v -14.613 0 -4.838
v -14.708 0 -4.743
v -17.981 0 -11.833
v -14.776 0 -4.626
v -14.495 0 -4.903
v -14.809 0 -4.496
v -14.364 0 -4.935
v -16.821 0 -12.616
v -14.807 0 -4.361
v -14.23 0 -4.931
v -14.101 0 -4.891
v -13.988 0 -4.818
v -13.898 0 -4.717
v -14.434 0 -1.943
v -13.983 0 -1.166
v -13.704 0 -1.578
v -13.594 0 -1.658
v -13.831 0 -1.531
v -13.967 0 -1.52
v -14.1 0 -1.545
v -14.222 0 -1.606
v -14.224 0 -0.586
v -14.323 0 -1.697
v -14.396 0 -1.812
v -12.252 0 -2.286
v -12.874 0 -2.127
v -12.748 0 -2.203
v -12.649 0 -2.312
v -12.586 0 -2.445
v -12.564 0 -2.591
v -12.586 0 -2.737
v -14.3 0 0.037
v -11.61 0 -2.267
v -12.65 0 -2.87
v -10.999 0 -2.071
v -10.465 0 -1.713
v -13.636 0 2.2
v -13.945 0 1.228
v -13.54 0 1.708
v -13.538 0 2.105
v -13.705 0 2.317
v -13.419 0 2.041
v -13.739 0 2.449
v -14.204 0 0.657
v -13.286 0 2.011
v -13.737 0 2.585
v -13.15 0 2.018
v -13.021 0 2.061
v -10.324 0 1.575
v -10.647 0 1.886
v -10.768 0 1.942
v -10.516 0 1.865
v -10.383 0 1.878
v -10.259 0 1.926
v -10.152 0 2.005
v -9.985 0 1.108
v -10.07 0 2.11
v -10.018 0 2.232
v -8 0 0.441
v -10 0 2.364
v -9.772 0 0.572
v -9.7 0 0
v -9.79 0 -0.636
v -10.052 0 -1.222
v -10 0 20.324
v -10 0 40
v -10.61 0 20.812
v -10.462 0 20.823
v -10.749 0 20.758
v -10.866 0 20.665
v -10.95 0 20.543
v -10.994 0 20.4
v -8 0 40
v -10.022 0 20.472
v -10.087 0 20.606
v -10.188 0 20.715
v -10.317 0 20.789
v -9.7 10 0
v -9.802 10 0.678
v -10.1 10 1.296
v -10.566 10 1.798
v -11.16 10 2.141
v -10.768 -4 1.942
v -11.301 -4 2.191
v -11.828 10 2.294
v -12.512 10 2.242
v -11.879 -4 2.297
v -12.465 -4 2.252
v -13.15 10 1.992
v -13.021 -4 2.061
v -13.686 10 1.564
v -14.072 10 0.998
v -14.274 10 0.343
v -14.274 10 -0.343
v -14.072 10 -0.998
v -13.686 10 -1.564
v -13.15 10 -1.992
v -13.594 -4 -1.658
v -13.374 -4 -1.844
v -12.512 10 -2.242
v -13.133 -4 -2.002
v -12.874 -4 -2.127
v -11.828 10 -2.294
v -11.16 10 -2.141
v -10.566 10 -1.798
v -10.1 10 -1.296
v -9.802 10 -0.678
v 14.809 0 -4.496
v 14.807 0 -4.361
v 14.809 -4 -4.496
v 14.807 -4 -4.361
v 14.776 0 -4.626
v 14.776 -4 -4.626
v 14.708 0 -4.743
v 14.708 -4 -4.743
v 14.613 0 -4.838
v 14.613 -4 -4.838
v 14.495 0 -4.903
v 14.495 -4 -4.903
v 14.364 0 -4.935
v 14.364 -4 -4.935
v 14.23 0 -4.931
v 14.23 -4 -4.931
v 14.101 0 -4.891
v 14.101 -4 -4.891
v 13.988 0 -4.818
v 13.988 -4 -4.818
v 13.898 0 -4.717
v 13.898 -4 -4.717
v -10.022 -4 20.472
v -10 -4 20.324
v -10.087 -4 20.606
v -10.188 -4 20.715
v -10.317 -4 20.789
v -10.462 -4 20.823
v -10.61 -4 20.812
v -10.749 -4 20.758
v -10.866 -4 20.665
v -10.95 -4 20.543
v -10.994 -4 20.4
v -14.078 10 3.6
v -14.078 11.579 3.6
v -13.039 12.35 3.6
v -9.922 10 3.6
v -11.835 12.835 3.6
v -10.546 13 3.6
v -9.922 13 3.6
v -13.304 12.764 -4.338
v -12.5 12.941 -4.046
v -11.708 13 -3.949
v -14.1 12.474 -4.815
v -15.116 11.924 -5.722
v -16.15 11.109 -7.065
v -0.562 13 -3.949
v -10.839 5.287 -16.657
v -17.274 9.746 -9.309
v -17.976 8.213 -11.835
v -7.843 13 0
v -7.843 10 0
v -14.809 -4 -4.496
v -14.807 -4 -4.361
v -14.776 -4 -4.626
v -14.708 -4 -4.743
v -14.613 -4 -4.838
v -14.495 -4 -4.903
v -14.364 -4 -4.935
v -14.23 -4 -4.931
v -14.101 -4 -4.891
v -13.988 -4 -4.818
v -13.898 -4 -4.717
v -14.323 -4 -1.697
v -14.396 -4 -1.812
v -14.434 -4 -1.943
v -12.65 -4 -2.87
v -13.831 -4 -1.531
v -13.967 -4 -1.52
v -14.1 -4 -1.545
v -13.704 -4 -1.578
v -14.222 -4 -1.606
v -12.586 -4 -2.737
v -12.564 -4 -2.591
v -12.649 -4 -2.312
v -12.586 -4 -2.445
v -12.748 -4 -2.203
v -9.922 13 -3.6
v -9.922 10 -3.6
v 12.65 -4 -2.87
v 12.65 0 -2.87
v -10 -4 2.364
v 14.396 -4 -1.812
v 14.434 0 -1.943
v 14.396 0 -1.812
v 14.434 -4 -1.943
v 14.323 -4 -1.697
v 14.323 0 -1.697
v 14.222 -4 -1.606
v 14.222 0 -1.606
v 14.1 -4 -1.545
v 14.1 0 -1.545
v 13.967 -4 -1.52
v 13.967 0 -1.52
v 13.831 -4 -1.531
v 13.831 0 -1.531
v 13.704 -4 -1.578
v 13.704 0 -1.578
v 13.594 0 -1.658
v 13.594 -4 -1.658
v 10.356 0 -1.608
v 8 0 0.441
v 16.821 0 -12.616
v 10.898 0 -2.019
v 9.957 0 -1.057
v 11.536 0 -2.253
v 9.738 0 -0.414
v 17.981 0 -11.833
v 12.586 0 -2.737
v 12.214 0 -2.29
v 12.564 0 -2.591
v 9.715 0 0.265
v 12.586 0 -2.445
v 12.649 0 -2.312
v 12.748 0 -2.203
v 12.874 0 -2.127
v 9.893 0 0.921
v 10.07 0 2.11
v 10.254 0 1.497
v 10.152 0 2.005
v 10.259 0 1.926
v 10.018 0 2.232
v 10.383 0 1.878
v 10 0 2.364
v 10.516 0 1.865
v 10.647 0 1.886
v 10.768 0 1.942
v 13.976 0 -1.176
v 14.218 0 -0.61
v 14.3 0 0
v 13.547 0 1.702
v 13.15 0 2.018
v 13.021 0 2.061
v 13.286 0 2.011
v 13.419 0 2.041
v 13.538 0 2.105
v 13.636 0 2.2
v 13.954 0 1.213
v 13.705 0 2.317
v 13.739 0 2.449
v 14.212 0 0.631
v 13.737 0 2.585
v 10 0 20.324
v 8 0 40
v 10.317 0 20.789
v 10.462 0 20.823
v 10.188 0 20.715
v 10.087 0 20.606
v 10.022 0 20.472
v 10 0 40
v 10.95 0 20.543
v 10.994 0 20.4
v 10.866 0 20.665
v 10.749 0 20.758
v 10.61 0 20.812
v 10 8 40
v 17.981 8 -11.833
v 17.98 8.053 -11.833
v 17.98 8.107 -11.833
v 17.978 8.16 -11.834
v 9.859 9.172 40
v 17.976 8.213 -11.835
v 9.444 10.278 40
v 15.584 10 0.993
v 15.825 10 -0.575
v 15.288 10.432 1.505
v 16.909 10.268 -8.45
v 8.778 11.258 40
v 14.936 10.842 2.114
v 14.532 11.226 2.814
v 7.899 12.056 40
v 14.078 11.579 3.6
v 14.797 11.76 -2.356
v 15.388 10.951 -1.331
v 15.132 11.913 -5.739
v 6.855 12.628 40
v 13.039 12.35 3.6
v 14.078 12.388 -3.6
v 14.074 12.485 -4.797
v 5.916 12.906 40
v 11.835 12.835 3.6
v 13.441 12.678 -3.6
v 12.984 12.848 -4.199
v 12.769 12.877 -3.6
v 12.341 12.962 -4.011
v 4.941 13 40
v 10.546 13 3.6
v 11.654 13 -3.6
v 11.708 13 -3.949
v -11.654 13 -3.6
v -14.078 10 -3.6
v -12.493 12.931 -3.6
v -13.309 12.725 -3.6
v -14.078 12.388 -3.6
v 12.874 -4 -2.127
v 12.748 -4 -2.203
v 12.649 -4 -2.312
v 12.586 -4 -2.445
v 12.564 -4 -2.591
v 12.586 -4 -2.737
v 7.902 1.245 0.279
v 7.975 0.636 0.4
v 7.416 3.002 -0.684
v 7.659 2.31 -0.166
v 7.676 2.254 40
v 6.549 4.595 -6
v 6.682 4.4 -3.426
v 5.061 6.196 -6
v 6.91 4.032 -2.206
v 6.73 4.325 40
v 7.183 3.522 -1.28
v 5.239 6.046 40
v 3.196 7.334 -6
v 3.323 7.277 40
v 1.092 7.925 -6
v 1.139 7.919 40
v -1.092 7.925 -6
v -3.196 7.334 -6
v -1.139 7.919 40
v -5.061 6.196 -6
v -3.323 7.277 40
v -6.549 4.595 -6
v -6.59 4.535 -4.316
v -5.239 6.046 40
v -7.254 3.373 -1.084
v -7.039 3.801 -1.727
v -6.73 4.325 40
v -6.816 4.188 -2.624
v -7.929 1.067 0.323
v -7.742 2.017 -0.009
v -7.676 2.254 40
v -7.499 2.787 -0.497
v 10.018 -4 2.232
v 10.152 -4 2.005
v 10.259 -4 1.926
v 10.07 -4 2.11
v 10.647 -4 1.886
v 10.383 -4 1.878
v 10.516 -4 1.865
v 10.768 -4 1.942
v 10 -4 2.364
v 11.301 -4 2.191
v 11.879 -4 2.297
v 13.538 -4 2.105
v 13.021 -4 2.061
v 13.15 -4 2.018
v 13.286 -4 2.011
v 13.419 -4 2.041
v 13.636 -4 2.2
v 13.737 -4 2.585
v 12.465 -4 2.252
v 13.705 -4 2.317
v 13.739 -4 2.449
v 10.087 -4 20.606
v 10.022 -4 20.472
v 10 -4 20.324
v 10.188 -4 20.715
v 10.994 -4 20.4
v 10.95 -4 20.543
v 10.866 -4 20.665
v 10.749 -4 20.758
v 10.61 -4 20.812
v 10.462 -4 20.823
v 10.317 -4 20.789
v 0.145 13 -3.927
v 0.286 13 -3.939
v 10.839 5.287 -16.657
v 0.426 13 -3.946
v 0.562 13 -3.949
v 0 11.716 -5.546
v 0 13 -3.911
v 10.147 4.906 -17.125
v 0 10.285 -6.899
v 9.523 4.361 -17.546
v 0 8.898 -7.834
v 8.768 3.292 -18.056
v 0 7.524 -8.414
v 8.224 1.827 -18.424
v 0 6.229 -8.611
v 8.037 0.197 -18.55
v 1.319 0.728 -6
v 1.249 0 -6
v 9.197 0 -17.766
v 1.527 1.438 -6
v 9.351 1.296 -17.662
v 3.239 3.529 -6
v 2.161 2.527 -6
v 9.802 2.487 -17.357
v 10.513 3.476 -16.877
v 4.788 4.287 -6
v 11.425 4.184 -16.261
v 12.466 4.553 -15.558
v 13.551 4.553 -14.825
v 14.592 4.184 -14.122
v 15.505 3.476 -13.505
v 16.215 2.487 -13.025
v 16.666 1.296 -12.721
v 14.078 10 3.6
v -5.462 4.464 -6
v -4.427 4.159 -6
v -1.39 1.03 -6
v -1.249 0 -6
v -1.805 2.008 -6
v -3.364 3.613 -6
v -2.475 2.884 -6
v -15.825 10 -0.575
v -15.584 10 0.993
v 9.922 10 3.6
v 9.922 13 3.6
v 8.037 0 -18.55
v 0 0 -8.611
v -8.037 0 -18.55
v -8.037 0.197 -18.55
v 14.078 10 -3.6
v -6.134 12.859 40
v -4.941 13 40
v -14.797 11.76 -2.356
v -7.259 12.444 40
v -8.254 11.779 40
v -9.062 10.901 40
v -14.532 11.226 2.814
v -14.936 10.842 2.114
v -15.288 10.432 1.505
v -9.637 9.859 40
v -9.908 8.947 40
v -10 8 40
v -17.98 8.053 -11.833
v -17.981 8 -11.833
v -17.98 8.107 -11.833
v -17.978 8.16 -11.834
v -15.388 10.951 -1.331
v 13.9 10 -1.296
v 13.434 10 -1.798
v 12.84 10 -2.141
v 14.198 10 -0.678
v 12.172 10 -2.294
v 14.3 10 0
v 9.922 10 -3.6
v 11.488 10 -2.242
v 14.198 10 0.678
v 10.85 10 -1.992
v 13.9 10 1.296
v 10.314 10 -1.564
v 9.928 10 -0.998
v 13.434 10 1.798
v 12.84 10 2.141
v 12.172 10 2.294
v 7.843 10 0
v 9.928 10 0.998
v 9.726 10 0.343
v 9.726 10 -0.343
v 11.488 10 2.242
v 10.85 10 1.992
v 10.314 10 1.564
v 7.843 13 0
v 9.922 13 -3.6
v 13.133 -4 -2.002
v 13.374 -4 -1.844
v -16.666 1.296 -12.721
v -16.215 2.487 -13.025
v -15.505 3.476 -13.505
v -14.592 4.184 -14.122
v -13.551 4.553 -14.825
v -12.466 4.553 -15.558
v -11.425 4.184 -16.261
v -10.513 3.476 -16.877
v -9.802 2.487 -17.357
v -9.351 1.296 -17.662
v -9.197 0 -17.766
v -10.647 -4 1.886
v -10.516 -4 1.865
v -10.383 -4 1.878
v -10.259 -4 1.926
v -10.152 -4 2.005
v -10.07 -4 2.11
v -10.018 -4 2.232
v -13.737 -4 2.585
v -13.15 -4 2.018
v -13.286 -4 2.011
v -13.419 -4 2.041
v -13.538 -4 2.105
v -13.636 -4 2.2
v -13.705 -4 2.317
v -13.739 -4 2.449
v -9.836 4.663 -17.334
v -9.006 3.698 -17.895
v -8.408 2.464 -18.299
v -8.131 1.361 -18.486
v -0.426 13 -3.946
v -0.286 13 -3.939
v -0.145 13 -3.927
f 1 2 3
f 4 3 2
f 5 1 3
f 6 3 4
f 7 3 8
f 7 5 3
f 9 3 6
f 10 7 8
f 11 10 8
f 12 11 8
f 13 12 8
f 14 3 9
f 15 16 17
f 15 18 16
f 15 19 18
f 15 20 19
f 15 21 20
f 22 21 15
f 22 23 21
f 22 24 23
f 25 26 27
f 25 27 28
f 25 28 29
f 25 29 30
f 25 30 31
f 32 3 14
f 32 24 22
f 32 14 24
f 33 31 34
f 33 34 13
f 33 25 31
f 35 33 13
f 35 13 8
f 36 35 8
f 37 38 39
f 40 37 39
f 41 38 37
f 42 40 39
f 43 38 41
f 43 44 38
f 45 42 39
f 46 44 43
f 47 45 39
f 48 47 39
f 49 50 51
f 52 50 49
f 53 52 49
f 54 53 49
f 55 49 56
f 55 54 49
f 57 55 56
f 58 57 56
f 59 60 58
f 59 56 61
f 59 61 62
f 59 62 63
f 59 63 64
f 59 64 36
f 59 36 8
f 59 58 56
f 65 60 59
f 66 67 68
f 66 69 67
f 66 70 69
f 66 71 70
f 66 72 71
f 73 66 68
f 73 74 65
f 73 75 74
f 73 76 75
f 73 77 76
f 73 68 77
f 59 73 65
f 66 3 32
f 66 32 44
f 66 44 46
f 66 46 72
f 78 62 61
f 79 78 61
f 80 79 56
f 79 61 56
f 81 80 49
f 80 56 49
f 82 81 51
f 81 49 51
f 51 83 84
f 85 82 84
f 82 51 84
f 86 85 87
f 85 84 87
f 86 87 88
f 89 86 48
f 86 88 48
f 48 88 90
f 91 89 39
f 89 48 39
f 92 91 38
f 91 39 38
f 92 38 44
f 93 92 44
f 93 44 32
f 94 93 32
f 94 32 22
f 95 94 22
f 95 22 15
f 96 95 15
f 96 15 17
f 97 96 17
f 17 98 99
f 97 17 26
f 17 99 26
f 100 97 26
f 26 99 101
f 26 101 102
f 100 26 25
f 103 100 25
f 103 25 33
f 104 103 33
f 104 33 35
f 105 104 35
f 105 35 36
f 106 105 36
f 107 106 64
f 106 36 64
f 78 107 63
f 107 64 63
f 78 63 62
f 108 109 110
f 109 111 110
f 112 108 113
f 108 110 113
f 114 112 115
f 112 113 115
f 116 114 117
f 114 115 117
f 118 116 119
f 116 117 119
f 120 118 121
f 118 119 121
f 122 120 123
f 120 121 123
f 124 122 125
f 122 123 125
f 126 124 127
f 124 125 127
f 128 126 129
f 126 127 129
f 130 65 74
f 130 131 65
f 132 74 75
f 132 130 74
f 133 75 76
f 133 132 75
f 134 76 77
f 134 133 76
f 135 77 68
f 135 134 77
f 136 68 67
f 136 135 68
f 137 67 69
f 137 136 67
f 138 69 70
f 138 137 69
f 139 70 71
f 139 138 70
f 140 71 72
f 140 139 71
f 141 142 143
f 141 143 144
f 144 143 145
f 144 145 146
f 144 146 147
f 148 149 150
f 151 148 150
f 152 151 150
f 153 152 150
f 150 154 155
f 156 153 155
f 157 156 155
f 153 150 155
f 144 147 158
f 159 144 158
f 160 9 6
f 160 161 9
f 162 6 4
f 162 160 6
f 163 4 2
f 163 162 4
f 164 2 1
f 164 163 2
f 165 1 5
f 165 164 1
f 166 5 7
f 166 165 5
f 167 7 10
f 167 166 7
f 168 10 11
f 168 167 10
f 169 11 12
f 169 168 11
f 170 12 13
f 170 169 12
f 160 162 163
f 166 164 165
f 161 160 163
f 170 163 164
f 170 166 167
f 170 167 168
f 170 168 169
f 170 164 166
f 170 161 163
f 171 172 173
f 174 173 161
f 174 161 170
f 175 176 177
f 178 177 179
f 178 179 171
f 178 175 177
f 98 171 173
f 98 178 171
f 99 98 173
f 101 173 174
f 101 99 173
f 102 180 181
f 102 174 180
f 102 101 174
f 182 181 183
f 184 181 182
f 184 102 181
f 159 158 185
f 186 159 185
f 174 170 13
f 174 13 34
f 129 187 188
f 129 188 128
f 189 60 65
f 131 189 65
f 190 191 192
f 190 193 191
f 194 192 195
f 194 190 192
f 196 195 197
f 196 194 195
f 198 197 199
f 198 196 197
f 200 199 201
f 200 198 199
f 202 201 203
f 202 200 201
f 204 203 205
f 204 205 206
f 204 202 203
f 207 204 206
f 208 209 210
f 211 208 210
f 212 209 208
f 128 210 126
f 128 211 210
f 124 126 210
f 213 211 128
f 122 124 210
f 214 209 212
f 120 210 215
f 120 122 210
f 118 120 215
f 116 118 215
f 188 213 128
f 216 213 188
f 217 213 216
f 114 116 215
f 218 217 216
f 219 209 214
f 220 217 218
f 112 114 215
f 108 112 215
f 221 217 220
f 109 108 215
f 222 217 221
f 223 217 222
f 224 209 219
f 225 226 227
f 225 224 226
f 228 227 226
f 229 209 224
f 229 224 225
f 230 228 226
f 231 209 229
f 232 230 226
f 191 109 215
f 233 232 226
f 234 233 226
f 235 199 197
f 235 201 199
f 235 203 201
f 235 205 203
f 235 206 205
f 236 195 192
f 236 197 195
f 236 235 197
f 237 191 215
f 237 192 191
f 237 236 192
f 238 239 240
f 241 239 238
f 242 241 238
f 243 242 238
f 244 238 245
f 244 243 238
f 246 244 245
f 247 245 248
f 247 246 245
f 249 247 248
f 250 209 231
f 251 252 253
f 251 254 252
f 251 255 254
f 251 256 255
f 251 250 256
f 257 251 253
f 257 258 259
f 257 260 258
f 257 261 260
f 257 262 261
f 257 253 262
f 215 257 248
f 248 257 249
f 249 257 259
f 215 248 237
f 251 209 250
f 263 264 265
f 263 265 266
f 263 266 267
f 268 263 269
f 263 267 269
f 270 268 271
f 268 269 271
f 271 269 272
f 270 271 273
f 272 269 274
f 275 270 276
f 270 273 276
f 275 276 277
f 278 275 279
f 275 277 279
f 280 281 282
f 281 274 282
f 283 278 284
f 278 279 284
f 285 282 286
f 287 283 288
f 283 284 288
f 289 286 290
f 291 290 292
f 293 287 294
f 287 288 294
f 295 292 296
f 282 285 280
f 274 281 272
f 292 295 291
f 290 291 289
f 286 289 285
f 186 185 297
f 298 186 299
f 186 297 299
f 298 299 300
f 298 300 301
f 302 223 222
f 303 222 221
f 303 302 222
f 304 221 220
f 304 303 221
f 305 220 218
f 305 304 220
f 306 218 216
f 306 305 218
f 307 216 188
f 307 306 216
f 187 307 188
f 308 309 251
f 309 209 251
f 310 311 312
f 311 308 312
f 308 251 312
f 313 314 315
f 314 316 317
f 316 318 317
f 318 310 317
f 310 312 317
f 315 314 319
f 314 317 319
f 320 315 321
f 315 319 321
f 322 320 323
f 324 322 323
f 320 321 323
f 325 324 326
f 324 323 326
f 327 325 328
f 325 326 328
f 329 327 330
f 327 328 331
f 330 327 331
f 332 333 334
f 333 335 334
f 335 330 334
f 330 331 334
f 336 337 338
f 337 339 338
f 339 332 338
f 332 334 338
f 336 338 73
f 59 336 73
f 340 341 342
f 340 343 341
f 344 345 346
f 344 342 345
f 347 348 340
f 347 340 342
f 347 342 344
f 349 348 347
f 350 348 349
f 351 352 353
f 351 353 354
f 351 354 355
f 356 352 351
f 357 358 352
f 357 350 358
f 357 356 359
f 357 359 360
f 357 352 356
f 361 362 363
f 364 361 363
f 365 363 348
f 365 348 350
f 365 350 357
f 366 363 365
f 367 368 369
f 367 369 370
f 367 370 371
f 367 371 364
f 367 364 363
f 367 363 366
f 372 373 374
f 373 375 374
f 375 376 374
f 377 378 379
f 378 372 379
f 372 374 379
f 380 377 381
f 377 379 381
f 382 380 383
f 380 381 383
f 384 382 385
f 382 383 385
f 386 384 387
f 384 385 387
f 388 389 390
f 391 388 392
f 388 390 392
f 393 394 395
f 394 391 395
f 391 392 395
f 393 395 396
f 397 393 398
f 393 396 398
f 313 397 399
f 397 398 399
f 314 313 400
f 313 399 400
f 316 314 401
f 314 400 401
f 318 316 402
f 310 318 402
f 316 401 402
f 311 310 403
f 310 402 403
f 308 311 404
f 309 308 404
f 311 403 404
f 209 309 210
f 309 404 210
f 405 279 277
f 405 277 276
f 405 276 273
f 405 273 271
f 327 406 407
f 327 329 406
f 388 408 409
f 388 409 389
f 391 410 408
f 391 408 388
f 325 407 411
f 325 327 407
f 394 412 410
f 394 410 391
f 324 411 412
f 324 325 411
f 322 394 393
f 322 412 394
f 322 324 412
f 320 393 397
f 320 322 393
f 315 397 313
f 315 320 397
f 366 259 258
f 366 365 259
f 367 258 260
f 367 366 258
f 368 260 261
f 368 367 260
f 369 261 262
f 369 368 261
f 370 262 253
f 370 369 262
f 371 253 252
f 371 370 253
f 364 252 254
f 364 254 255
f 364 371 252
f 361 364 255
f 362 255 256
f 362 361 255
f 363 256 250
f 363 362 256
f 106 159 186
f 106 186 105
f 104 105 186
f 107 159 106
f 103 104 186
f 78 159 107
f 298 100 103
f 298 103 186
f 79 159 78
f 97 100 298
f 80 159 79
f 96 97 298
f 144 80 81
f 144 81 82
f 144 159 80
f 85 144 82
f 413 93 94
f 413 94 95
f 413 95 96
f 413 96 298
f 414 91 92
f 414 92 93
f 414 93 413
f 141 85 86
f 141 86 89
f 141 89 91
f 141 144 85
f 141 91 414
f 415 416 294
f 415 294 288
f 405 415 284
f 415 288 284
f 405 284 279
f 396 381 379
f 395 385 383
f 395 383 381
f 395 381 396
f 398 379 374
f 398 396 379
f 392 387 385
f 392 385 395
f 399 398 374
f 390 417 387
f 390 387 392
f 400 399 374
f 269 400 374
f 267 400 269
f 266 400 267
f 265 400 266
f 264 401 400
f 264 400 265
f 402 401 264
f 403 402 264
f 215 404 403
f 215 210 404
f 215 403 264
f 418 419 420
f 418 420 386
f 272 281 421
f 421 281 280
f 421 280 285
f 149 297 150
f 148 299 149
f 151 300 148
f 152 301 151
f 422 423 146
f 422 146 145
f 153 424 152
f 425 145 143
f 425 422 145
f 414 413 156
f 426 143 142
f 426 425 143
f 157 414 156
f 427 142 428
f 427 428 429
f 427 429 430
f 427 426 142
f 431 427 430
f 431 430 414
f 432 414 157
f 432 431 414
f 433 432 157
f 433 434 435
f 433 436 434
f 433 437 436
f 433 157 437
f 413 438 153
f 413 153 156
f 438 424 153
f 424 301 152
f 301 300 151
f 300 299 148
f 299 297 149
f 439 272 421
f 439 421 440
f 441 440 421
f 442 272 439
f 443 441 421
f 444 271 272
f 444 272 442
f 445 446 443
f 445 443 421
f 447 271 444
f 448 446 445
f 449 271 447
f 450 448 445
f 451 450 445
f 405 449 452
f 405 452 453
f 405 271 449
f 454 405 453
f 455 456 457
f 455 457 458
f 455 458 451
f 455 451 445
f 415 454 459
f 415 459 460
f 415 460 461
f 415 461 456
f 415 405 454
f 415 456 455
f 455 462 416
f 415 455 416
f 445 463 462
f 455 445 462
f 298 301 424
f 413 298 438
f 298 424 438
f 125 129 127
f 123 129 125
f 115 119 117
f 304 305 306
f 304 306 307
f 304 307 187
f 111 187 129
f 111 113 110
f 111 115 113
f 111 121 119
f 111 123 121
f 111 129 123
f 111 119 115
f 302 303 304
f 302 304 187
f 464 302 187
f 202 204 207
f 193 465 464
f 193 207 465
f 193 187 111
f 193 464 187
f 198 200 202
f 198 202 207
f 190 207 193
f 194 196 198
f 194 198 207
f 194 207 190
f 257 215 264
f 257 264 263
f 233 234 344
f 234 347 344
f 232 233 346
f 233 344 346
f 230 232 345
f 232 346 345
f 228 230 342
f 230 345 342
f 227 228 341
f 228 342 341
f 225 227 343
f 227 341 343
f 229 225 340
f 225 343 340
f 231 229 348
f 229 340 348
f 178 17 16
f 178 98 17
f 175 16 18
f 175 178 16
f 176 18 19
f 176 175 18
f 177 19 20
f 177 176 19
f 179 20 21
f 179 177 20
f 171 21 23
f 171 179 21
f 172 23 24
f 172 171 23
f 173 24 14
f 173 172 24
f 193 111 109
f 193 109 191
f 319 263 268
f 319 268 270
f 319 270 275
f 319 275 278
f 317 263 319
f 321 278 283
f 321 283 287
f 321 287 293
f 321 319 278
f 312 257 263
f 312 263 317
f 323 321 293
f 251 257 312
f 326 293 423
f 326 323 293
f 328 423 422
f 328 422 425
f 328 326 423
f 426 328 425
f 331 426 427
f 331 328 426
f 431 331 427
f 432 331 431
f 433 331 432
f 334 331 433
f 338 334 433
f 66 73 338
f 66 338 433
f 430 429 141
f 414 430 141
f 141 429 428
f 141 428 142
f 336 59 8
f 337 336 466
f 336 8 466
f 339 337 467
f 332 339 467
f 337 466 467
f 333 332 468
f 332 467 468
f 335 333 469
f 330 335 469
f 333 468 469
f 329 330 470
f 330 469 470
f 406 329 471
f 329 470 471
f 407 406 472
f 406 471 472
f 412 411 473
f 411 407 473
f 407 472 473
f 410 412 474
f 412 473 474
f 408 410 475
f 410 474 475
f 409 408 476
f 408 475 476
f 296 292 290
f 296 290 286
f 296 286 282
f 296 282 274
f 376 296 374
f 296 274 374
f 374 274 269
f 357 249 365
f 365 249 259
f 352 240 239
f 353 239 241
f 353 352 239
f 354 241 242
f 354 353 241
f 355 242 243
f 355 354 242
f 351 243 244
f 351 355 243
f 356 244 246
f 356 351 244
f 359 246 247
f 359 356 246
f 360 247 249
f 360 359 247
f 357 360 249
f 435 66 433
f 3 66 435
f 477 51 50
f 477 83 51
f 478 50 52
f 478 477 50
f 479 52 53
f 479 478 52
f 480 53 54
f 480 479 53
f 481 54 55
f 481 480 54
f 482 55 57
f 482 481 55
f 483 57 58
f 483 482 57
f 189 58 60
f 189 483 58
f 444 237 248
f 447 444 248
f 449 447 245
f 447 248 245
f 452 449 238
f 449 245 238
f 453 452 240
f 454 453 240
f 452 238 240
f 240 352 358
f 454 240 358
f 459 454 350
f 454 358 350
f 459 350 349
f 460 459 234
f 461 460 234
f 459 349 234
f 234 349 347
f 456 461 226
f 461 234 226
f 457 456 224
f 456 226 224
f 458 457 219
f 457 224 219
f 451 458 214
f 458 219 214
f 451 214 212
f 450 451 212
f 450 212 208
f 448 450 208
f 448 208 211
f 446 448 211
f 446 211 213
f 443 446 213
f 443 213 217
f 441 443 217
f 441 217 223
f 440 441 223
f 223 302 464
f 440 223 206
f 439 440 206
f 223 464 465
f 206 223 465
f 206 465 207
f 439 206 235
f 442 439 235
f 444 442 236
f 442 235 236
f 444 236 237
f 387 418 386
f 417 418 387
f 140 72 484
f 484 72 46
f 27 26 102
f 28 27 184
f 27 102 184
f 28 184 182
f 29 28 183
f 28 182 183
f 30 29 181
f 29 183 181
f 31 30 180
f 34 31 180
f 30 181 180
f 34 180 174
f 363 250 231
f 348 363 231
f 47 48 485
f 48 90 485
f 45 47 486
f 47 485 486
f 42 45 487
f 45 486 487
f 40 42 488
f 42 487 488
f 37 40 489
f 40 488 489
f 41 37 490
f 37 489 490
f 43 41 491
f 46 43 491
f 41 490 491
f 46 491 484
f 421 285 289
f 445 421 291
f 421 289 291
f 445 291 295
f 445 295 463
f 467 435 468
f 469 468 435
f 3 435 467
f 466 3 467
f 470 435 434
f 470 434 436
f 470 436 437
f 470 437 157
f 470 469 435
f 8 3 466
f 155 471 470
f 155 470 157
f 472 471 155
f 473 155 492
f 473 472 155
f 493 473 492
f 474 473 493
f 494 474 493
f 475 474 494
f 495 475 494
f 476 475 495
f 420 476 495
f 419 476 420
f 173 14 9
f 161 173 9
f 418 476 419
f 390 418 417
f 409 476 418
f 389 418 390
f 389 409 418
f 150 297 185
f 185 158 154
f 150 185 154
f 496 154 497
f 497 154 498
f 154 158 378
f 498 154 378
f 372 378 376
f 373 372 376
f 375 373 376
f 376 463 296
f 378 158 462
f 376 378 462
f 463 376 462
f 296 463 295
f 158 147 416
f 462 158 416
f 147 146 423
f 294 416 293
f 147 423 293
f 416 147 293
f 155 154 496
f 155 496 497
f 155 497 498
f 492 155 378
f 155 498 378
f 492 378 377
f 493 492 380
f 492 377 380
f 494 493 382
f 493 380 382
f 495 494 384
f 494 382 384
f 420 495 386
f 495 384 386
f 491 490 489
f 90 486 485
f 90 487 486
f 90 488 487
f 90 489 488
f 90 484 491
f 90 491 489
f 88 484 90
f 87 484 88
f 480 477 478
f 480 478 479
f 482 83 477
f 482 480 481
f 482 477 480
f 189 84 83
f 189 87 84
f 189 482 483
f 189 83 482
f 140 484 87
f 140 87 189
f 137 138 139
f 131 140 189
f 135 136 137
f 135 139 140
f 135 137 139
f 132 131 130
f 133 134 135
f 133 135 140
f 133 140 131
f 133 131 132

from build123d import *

# Parameters (mm, degrees)
F0_R          = 2.3
F1_DEPTH      = 13
F3_DEPTH      = 46
F6_DEPTH      = 52.2
F8_DEPTH      = 25
F10_DEPTH     = 25
F11_T1_DEPTH  = 69.4664340584
F11_T3_DEPTH  = 69.4664340584
F11_T8_DEPTH  = 31.9524083705
F11_T13_DEPTH = 31.9524083705
F11_T19_DEPTH = 31.9524083705
F11_T23_DEPTH = 31.9524083705
F15_DEPTH     = 4
F16_DEPTH     = 4
F19_DEPTH     = 28
F20_R         = 2.3
F21_DEPTH     = 25
F22_R         = 2.3
F23_DEPTH     = 25
F24_R         = 0.5


# Not quite as in the source:
# - a fillet or chamfer that OpenCascade refuses, or shapes differently, is made with other operations: its cross-section is extruded or revolved along the edge and cut away or added
# - a feature names something its author has since deleted; it is built from what else it names


with BuildPart() as f1:
    # F0 (on Front) → F1 (new body)
    with BuildSketch(Plane.XZ):
        Polygon((10, 40), (-10, 40), (-17.9806351662, -11.8325809017), (-8.0368565166, -18.5498173996), (0, -8.6111112242), (8.0368565166, -18.5498173996), (17.9806351662, -11.8325809017), align=None)
        with Locations((-12, 0)):
            Circle(F0_R, mode=Mode.SUBTRACT)
        with Locations((12, 0)):
            Circle(F0_R, mode=Mode.SUBTRACT)
    extrude(amount=-F1_DEPTH)

    # F2 (on face) → F3 (cut)
    with BuildSketch(Plane.XY.offset(40)):
        with BuildLine():
            Line((-8, 0), (8, 0))
            ThreePointArc((8, 0), (0, 8), (-8, 0))
        make_face()
    extrude(amount=-F3_DEPTH, mode=Mode.SUBTRACT)

    # F5 (on offset) → F6 (cut)
    with BuildSketch(Plane.YZ.offset(25)):
        Polygon((13, -3.9485500787), (4.1381944902, -18.5498173996), (13, -18.5498173996), align=None)
    extrude(amount=-F6_DEPTH, mode=Mode.SUBTRACT)

    # F7 (on face) → F8 (cut)
    with BuildSketch(Plane(origin=(-11.122658813, 0, -16.4652915326), x_dir=(0.8286482208, 0, -0.5597697082), z_dir=(-0.5597697082, 0, -0.8286482208))):
        with BuildLine():
            ThreePointArc((-6.8761009811, 0), (-2.2761009811, -4.6), (2.3238990189, 0))
            Line((2.3238990189, 0), (-6.8761009811, 0))
        make_face()
    extrude(amount=-F8_DEPTH, mode=Mode.SUBTRACT)

    # F9 (on face) → F10 (cut)
    with BuildSketch(Plane(origin=(11.122658813, 0, -16.4652915326), x_dir=(0.8286482208, 0, 0.5597697082), z_dir=(0.5597697082, 0, -0.8286482208))):
        with BuildLine():
            ThreePointArc((-2.3238990189, 0), (2.2761009811, -4.6), (6.8761009811, 0))
            Line((6.8761009811, 0), (-2.3238990189, 0))
        make_face()
    extrude(amount=-F10_DEPTH, mode=Mode.SUBTRACT)

    # F11: fillet of radius 5 on 4 edges, made by hand

    # F11_s2 → F11_t1 (cut)
    with BuildSketch(Plane(origin=(7.6867833124, 0, 49.9240736631), x_dir=(0, 1, 0), z_dir=(-0.152176248, 0, -0.9883533728))):
        with BuildLine():
            ThreePointArc((13, -10.9705836466), (11.5355339059, -14.5061175525), (8, -15.9705836466))
            Line((8, -15.9705836466), (13, -15.9705836466))
            Line((13, -15.9705836466), (13, -10.9705836466))
        make_face()
    extrude(amount=F11_T1_DEPTH, mode=Mode.SUBTRACT)

    # F11_s4 → F11_t3 (cut)
    with BuildSketch(Plane(origin=(2.8843579817, 0, -18.733310736), x_dir=(0, 1, 0), z_dir=(-0.152176248, 0, 0.9883533728))):
        with BuildLine():
            ThreePointArc((8, -15.9705836466), (11.5355339059, -14.5061175525), (13, -10.9705836466))
            Line((13, -10.9705836466), (13, -15.9705836466))
            Line((13, -15.9705836466), (8, -15.9705836466))
        make_face()
    extrude(amount=F11_T3_DEPTH, mode=Mode.SUBTRACT)


with BuildPart() as f11_tool6:
    # F11_s7 → F11_t8 (new body)
    with BuildSketch(Plane(origin=(4.0911710208, 3.0705977915, 5.0593097692), x_dir=(0.6002776597, -0.7997916799, 0), z_dir=(-0.5686414, -0.4267895471, -0.7032052622))):
        with BuildLine():
            ThreePointArc((-10.7347001393, -7.9787789452), (-7.9821654916, -9.2854915519), (-4.9822833283, -8.7519638303))
            Line((-4.9822833283, -8.7519638303), (-8.1340389445, -10.4154145762))
            Line((-8.1340389445, -10.4154145762), (-10.7347001393, -7.9787789452))
        make_face()
    extrude(amount=F11_T8_DEPTH)

    split(bisect_by=Plane(origin=(-4.2102294585, 0, -3.404568911), x_dir=(0, 1, 0), z_dir=(-0.7775800359, 0, -0.6287839754)), keep=Keep.TOP)


with BuildPart() as f1_1:
    add(f1.part)

    # F11_t5: cut F11_tool6
    add(f11_tool6.part, mode=Mode.SUBTRACT)


with BuildPart() as f11_tool11:
    # F11_s12 → F11_t13 (new body)
    with BuildSketch(Plane(origin=(14.0782912081, -10.566356105, -17.4097919354), x_dir=(-0.6002776597, -0.7997916799, 0), z_dir=(-0.5686414, 0.4267895471, 0.7032052622))):
        with BuildLine():
            ThreePointArc((-10.7347001393, -7.9787789452), (-7.9821654916, -9.2854915519), (-4.9822833283, -8.7519638303))
            Line((-4.9822833283, -8.7519638303), (-8.1340389445, -10.4154145762))
            Line((-8.1340389445, -10.4154145762), (-10.7347001393, -7.9787789452))
        make_face()
    extrude(amount=F11_T13_DEPTH)

    split(bisect_by=Plane(origin=(4.2102294585, 0, -3.404568911), x_dir=(0, 1, 0), z_dir=(0.7775800359, 0, -0.6287839754)), keep=Keep.TOP)


with BuildPart() as f1_2:
    add(f1_1.part)

    # F11_t10: cut F11_tool11
    add(f11_tool11.part, mode=Mode.SUBTRACT)


with BuildPart() as f11_tool17:
    # F11_s18 → F11_t19 (new body)
    with BuildSketch(Plane(origin=(14.0782912081, -10.566356105, -17.4097919354), x_dir=(-0.6002776597, -0.7997916799, 0), z_dir=(-0.5686414, 0.4267895471, 0.7032052622))):
        with BuildLine():
            ThreePointArc((-10.7347001393, -7.9787789452), (-7.9821654916, -9.2854915519), (-4.9822833283, -8.7519638303))
            Line((-4.9822833283, -8.7519638303), (-8.1340389445, -10.4154145762))
            Line((-8.1340389445, -10.4154145762), (-10.7347001393, -7.9787789452))
        make_face()
    extrude(amount=F11_T19_DEPTH)

    split(bisect_by=Plane(origin=(4.2102294585, 0, -3.404568911), x_dir=(0, 1, 0), z_dir=(-0.7775800359, 0, 0.6287839754)), keep=Keep.TOP)


with BuildPart() as f11_tool21:
    # F11_s22 → F11_t23 (new body)
    with BuildSketch(Plane(origin=(4.0911710208, 3.0705977915, 5.0593097692), x_dir=(0.6002776597, -0.7997916799, 0), z_dir=(-0.5686414, -0.4267895471, -0.7032052622))):
        with BuildLine():
            ThreePointArc((-10.7347001393, -7.9787789452), (-7.9821654916, -9.2854915519), (-4.9822833283, -8.7519638303))
            Line((-4.9822833283, -8.7519638303), (-8.1340389445, -10.4154145762))
            Line((-8.1340389445, -10.4154145762), (-10.7347001393, -7.9787789452))
        make_face()
    extrude(amount=F11_T23_DEPTH)

    split(bisect_by=Plane(origin=(-4.2102294585, 0, -3.404568911), x_dir=(0, 1, 0), z_dir=(0.7775800359, 0, 0.6287839754)), keep=Keep.TOP)


with BuildPart() as f11_tool17_1:
    add(f11_tool17.part)

    # F11_t25: intersect F11_tool21
    add(f11_tool21.part, mode=Mode.INTERSECT)


with BuildPart() as f1_3:
    add(f1_2.part)

    # F11_t15: cut F11_tool17
    add(f11_tool17_1.part, mode=Mode.SUBTRACT)

    # F14 (on face) → F15 (join)
    with BuildSketch(Plane.XZ):
        Polygon((-15.1459260242, -6.5643846345), (-10, 1.0533238305), (-10, 26.8573445146), align=None)
    extrude(amount=F15_DEPTH)

    # F12 (on face) → F16 (join)
    with BuildSketch(Plane.XZ):
        Polygon((15.1459253956, -6.5643830302), (10.0000003771, 26.8573395869), (10.0000003771, 1.0533239459), align=None)
    extrude(amount=F16_DEPTH)

    # F18 (on offset) → F19 (cut)
    with BuildSketch(Plane(origin=(0, 38, 0), x_dir=(-1, 0, 0), z_dir=(0, 1, 0))):
        Polygon((-9.9215390309, 3.6), (-14.0784609691, 3.6), (-16.1569219382, 0), (-14.0784609691, -3.6), (-9.9215390309, -3.6), (-7.8430780618, 0), align=None)
        Polygon((14.0784609691, 3.6), (9.9215390309, 3.6), (7.8430780618, 0), (9.9215390309, -3.6), (14.0784609691, -3.6), (16.1569219382, 0), align=None)
    extrude(amount=-F19_DEPTH, mode=Mode.SUBTRACT)

    # F20 (on face) → F21 (cut)
    with BuildSketch(Plane.XZ.offset(4)):
        with Locations((12, 0)):
            Circle(F20_R)
    extrude(amount=-F21_DEPTH, mode=Mode.SUBTRACT)

    # F22 (on face) → F23 (cut)
    with BuildSketch(Plane.XZ.offset(4)):
        with Locations((-12, 0)):
            Circle(F22_R)
    extrude(amount=-F23_DEPTH, mode=Mode.SUBTRACT)

    # F24
    f24_edges = [f1_3.edges().sort_by_distance(p)[0] for p in [
        (-10, -2, 26.857345),
        (10, -2, 26.85734),
        (-15.145926, -2, -6.564385),
        (15.145925, -2, -6.564383),
        (-10, -2, 1.135782),
        (-13.946588, -2, 1.22507),
        (-14.224942, -2, -0.582781),
        (10, -2, 1.135782),
        (13.946587, -2, 1.22507),
        (14.224941, -2, -0.582782),
        (12.255618, -2, -2.285751),
        (-12.255617, -2, -2.285751),
    ]]
    fillet(f24_edges, radius=F24_R)


solid = f1_3.part
